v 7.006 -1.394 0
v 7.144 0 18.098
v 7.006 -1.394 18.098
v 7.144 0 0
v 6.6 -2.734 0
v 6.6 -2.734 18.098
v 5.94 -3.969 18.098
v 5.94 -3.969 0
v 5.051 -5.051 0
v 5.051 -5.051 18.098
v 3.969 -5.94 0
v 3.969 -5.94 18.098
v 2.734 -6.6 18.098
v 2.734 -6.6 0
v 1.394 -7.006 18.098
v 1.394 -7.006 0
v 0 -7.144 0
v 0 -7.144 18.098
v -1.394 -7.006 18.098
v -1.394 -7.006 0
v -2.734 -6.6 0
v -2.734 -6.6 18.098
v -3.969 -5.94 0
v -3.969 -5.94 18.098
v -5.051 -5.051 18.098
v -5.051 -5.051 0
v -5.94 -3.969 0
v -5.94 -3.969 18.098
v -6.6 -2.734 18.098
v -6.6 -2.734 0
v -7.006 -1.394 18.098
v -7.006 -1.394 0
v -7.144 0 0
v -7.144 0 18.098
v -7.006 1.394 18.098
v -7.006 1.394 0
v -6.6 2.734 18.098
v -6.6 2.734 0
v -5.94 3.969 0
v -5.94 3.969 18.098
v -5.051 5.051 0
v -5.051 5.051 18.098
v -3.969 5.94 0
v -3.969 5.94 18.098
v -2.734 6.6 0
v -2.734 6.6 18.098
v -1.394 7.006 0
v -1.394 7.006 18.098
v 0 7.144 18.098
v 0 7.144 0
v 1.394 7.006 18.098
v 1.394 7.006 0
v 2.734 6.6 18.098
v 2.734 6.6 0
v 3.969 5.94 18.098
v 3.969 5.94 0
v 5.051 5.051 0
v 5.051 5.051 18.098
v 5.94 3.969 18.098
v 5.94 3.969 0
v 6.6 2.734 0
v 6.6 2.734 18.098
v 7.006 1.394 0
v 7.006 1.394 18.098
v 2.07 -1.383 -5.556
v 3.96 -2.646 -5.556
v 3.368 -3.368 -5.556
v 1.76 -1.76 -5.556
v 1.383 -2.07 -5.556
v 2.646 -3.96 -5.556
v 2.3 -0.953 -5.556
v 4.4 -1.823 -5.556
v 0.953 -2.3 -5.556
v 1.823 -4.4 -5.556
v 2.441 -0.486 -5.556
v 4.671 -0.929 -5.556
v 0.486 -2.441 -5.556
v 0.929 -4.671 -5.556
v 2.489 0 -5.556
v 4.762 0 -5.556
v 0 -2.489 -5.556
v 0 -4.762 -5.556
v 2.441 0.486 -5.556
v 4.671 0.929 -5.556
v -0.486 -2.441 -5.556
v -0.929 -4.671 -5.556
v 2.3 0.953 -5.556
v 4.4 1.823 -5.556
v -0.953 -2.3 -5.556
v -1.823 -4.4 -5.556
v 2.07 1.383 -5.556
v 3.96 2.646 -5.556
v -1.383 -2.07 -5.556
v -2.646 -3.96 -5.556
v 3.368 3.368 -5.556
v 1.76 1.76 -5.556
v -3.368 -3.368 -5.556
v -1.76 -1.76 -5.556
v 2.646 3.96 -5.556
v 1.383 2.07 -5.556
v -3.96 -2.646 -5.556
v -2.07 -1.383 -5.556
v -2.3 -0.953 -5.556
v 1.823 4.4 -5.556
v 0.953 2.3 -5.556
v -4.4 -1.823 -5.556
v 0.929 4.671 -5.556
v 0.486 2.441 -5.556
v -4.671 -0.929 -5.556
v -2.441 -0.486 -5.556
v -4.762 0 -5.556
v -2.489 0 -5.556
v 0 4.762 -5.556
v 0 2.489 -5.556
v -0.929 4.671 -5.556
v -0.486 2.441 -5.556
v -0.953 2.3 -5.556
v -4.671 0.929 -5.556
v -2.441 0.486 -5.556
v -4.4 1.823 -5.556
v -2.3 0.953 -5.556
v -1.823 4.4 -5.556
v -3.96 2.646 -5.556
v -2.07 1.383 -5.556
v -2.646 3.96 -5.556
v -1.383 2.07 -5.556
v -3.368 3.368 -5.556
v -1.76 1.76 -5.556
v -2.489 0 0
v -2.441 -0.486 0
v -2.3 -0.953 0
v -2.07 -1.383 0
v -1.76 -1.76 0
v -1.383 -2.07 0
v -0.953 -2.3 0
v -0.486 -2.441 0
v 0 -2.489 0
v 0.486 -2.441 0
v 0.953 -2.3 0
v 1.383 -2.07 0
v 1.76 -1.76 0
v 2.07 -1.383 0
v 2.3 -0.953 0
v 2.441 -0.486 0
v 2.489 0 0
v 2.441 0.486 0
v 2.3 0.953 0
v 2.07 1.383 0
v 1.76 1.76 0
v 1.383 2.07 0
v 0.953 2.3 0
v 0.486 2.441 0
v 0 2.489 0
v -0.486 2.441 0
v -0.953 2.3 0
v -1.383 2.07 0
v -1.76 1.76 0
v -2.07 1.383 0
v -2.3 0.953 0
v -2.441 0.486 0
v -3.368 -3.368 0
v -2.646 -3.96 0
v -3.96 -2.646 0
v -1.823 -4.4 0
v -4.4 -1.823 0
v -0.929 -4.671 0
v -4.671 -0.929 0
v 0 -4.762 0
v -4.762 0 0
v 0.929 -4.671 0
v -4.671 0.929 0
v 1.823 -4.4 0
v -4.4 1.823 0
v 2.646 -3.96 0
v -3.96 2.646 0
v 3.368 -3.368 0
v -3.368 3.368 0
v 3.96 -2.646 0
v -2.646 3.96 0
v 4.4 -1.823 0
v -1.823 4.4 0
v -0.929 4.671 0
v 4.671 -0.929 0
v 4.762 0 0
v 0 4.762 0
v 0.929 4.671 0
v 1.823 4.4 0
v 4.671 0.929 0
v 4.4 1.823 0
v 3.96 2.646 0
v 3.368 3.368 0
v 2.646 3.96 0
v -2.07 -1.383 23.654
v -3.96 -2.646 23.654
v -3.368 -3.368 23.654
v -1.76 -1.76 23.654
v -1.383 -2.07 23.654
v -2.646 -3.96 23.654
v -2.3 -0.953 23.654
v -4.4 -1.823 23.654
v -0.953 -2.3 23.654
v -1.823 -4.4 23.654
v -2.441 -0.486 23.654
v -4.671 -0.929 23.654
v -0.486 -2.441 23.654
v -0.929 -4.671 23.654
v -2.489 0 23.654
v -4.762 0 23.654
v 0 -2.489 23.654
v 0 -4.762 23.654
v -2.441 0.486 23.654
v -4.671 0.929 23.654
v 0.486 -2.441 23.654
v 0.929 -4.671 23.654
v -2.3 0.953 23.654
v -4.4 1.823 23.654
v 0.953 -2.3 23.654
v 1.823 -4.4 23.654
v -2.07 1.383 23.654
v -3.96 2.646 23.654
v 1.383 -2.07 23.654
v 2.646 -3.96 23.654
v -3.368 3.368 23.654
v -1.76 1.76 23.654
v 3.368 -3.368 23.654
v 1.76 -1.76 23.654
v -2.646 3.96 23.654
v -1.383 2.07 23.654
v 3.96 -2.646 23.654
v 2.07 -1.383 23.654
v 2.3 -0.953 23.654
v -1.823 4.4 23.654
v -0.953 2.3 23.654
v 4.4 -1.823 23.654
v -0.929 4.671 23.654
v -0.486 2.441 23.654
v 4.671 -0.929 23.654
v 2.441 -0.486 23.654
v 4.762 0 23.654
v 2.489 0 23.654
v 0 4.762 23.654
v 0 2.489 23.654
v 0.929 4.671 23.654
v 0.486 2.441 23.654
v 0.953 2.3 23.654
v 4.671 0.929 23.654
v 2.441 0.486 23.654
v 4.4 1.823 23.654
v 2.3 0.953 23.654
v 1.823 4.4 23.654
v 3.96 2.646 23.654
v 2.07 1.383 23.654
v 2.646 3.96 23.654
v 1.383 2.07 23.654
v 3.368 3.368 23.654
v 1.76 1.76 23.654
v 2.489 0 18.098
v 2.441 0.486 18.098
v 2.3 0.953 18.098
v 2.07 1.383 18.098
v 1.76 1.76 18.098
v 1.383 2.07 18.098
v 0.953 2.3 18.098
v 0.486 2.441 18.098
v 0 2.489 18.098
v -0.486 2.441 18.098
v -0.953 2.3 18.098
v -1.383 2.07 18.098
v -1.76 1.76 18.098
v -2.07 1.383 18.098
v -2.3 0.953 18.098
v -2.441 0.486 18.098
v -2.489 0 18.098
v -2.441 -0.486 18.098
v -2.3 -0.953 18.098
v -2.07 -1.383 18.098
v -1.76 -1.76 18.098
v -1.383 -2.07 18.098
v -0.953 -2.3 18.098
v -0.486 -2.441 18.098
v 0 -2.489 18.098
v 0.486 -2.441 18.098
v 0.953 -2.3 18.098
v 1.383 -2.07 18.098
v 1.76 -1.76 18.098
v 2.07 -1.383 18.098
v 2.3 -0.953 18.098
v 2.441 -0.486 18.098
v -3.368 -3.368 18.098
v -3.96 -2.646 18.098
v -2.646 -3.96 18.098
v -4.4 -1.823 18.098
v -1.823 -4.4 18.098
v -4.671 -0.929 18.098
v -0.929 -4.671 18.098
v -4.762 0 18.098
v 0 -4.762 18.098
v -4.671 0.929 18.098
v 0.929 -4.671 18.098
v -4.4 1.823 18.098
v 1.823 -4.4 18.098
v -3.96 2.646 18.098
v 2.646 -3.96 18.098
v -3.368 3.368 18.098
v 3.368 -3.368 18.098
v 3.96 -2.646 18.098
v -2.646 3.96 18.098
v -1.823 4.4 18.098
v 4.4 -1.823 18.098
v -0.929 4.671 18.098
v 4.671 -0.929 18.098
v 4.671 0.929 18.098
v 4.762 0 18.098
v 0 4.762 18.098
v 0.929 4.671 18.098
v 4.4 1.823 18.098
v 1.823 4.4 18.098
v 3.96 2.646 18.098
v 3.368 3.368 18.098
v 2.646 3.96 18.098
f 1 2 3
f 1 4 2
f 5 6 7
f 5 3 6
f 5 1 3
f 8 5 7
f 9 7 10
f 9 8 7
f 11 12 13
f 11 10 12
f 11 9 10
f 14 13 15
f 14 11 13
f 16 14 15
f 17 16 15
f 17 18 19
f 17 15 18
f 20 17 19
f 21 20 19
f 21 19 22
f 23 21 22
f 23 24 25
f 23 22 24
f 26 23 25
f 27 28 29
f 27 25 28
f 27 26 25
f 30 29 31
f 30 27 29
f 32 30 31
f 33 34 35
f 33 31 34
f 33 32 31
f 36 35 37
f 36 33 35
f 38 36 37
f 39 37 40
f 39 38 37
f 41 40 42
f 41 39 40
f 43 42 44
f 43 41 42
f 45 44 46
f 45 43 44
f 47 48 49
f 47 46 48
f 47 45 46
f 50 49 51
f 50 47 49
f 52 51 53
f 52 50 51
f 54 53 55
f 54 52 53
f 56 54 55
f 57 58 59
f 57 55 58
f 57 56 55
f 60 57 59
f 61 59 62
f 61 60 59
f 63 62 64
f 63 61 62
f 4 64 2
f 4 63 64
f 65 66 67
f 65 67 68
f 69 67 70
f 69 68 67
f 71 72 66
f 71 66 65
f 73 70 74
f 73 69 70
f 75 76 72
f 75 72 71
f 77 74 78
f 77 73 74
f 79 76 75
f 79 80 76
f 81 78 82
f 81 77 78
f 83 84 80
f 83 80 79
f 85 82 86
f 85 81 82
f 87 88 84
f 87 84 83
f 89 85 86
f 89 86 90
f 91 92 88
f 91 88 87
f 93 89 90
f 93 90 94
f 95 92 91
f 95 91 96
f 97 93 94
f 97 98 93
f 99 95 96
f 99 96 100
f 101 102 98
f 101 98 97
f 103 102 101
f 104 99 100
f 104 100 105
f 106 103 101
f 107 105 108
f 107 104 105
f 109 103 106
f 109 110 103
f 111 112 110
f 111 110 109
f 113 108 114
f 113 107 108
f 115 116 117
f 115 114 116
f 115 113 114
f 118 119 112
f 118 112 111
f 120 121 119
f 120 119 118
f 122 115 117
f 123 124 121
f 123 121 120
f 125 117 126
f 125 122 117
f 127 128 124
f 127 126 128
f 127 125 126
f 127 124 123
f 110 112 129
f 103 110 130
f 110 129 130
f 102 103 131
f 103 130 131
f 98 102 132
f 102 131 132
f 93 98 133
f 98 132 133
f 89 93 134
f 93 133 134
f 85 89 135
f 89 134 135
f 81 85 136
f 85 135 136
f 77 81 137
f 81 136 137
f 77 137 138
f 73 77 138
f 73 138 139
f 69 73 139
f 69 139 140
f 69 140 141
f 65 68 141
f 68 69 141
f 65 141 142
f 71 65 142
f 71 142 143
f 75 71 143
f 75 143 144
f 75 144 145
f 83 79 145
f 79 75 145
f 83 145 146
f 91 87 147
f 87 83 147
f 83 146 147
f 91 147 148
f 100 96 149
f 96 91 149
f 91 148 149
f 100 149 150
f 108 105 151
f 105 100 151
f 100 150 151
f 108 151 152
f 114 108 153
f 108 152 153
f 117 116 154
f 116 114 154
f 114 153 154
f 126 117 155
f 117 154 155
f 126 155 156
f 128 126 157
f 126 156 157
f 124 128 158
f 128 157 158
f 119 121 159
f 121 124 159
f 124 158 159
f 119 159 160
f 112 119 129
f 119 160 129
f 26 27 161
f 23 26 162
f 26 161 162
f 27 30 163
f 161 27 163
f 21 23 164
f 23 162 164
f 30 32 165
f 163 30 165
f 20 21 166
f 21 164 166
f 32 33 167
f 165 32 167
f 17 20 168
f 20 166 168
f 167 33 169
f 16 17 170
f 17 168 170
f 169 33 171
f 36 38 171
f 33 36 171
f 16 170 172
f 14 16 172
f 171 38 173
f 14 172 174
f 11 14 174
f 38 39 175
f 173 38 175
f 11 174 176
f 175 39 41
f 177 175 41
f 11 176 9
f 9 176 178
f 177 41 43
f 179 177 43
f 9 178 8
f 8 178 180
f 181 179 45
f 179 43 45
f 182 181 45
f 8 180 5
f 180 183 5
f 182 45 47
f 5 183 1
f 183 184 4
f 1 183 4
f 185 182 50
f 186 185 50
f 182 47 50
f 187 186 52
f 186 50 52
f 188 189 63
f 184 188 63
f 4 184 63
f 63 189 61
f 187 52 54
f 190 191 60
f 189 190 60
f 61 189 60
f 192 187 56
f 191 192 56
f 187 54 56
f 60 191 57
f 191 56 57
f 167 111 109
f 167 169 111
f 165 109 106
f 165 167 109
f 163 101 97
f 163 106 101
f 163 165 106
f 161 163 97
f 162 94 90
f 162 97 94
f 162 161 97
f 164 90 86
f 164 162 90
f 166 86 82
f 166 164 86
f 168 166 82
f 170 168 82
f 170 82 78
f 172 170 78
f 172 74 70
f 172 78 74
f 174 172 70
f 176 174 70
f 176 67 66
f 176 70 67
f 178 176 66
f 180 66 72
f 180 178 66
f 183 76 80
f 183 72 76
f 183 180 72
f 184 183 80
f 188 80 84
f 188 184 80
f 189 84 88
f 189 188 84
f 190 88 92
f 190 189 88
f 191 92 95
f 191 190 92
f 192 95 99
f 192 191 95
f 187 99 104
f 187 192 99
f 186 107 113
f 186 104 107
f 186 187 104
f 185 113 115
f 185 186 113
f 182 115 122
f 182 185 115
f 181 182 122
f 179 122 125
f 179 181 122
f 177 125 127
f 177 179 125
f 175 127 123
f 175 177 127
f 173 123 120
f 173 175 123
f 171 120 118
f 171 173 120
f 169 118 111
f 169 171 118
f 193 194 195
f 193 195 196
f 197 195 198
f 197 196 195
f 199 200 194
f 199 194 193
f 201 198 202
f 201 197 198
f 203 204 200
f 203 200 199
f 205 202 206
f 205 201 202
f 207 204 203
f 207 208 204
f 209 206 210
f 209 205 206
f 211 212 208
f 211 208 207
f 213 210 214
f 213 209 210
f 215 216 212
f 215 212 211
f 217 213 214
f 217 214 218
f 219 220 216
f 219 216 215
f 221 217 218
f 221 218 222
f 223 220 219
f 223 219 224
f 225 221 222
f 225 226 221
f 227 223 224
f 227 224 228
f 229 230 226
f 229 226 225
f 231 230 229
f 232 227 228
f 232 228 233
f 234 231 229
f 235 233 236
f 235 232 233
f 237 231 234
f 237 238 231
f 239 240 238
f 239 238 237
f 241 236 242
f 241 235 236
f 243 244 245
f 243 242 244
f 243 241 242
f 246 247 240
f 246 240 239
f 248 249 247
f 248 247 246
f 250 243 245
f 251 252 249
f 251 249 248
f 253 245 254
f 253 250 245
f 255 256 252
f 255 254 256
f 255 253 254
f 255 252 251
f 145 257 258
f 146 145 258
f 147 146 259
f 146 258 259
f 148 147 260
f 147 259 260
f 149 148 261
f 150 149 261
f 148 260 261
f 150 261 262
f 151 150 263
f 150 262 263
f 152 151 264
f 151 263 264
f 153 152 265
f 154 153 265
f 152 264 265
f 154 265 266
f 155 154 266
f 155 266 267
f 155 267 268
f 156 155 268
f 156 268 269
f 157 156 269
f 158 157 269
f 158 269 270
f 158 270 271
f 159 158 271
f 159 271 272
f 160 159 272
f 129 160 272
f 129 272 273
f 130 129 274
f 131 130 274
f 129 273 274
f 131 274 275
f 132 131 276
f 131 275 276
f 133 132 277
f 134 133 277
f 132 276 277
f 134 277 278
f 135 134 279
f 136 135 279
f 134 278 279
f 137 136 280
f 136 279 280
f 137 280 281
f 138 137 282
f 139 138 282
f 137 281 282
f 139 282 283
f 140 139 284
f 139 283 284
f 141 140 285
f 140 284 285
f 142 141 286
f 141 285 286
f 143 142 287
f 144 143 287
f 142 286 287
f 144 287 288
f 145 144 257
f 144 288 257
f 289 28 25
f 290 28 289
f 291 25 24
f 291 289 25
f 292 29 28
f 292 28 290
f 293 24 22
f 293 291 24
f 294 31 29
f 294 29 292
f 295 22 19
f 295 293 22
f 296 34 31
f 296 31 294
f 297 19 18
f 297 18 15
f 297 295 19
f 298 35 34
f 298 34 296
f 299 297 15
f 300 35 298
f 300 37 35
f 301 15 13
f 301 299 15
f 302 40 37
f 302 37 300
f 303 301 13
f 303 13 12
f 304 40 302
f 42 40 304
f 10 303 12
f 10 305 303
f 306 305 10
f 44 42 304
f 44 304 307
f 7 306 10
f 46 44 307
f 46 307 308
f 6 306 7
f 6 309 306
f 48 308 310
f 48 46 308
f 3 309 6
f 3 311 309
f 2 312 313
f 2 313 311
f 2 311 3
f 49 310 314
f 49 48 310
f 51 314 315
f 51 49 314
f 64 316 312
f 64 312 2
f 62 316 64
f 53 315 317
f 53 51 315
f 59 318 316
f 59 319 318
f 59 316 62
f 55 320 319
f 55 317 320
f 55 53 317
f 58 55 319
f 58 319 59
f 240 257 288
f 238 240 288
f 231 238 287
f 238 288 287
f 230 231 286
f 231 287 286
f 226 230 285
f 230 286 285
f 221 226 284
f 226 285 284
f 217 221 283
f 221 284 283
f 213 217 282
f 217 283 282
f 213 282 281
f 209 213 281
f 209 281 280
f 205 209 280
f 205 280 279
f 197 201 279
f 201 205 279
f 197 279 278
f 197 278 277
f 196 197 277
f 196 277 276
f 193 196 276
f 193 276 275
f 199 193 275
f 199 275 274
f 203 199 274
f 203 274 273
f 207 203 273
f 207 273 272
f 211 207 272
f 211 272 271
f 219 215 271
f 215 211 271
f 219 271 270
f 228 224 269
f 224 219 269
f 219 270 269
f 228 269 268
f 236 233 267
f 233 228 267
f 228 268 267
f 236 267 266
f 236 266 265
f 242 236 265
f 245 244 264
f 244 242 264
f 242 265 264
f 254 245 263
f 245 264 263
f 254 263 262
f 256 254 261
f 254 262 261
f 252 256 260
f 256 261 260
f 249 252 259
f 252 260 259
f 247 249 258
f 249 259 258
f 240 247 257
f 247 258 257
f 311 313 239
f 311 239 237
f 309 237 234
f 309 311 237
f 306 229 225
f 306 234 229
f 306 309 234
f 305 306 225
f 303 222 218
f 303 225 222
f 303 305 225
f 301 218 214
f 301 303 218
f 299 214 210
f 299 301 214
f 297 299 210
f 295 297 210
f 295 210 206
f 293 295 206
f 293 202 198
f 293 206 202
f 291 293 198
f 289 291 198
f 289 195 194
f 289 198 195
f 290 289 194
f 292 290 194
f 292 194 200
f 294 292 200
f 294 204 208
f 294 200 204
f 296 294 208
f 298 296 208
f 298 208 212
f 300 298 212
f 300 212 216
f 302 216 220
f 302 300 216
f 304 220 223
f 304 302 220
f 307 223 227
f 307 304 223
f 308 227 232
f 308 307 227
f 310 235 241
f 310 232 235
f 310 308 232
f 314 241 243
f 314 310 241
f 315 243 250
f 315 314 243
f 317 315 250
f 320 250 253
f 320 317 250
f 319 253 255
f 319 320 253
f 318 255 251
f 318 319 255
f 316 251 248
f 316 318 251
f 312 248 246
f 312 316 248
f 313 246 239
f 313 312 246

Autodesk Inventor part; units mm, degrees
ref_plane "YZ Plane" through (0, 0, 0) normal (1, 0, 0) x (0, 1, 0)
ref_plane "XZ Plane" through (0, 0, 0) normal (0, 1, 0) x (-1, 0, 0)
sketch "Sketch1" plane through (0, 0, 0) normal (0, 0, 1) x (1, 0, 0)
  circle A0 centre (0, 0) radius 7.1437
  dimension "d0" = 14.2875
extrude "Extrusion1" add sketch "Sketch1" along normal blind 18.0975
ref_plane "Work Plane1" through (0, 0, 6.35) normal (0, 0, 1) x (1, 0, 0)
sketch "Sketch6" plane through (0, 0, 18.0975) normal (0, 0, 1) x (1, 0, 0)
  circle A0 centre (0, 0) radius 2.4892
  dimension "d28" = 4.9784
extrude "Extrusion3" cut sketch "Sketch6" against normal through all
sketch "Sketch7" plane through (0, 0, 18.0975) normal (0, 0, 1) x (1, 0, 0)
  circle A0 centre (0, 0) radius 4.7625
  circle A1 centre (0, 0) radius 2.4892
  dimension "d31" = 9.525
  dimension "d32" = 4.9784
extrude "Extrusion4" add sketch "Sketch7" along normal blind 5.5563
sketch "Sketch8" plane through (0, 0, 0) normal (0, 0, -1) x (-1, 0, 0)
  circle A0 centre (0, 0) radius 2.4892 projected
  circle A1 centre (0, 0) radius 4.7625 projected
extrude "Extrusion5" add sketch "Sketch8" along normal blind 5.5563
properties part number "RollerSpacer2(Bearing)"
